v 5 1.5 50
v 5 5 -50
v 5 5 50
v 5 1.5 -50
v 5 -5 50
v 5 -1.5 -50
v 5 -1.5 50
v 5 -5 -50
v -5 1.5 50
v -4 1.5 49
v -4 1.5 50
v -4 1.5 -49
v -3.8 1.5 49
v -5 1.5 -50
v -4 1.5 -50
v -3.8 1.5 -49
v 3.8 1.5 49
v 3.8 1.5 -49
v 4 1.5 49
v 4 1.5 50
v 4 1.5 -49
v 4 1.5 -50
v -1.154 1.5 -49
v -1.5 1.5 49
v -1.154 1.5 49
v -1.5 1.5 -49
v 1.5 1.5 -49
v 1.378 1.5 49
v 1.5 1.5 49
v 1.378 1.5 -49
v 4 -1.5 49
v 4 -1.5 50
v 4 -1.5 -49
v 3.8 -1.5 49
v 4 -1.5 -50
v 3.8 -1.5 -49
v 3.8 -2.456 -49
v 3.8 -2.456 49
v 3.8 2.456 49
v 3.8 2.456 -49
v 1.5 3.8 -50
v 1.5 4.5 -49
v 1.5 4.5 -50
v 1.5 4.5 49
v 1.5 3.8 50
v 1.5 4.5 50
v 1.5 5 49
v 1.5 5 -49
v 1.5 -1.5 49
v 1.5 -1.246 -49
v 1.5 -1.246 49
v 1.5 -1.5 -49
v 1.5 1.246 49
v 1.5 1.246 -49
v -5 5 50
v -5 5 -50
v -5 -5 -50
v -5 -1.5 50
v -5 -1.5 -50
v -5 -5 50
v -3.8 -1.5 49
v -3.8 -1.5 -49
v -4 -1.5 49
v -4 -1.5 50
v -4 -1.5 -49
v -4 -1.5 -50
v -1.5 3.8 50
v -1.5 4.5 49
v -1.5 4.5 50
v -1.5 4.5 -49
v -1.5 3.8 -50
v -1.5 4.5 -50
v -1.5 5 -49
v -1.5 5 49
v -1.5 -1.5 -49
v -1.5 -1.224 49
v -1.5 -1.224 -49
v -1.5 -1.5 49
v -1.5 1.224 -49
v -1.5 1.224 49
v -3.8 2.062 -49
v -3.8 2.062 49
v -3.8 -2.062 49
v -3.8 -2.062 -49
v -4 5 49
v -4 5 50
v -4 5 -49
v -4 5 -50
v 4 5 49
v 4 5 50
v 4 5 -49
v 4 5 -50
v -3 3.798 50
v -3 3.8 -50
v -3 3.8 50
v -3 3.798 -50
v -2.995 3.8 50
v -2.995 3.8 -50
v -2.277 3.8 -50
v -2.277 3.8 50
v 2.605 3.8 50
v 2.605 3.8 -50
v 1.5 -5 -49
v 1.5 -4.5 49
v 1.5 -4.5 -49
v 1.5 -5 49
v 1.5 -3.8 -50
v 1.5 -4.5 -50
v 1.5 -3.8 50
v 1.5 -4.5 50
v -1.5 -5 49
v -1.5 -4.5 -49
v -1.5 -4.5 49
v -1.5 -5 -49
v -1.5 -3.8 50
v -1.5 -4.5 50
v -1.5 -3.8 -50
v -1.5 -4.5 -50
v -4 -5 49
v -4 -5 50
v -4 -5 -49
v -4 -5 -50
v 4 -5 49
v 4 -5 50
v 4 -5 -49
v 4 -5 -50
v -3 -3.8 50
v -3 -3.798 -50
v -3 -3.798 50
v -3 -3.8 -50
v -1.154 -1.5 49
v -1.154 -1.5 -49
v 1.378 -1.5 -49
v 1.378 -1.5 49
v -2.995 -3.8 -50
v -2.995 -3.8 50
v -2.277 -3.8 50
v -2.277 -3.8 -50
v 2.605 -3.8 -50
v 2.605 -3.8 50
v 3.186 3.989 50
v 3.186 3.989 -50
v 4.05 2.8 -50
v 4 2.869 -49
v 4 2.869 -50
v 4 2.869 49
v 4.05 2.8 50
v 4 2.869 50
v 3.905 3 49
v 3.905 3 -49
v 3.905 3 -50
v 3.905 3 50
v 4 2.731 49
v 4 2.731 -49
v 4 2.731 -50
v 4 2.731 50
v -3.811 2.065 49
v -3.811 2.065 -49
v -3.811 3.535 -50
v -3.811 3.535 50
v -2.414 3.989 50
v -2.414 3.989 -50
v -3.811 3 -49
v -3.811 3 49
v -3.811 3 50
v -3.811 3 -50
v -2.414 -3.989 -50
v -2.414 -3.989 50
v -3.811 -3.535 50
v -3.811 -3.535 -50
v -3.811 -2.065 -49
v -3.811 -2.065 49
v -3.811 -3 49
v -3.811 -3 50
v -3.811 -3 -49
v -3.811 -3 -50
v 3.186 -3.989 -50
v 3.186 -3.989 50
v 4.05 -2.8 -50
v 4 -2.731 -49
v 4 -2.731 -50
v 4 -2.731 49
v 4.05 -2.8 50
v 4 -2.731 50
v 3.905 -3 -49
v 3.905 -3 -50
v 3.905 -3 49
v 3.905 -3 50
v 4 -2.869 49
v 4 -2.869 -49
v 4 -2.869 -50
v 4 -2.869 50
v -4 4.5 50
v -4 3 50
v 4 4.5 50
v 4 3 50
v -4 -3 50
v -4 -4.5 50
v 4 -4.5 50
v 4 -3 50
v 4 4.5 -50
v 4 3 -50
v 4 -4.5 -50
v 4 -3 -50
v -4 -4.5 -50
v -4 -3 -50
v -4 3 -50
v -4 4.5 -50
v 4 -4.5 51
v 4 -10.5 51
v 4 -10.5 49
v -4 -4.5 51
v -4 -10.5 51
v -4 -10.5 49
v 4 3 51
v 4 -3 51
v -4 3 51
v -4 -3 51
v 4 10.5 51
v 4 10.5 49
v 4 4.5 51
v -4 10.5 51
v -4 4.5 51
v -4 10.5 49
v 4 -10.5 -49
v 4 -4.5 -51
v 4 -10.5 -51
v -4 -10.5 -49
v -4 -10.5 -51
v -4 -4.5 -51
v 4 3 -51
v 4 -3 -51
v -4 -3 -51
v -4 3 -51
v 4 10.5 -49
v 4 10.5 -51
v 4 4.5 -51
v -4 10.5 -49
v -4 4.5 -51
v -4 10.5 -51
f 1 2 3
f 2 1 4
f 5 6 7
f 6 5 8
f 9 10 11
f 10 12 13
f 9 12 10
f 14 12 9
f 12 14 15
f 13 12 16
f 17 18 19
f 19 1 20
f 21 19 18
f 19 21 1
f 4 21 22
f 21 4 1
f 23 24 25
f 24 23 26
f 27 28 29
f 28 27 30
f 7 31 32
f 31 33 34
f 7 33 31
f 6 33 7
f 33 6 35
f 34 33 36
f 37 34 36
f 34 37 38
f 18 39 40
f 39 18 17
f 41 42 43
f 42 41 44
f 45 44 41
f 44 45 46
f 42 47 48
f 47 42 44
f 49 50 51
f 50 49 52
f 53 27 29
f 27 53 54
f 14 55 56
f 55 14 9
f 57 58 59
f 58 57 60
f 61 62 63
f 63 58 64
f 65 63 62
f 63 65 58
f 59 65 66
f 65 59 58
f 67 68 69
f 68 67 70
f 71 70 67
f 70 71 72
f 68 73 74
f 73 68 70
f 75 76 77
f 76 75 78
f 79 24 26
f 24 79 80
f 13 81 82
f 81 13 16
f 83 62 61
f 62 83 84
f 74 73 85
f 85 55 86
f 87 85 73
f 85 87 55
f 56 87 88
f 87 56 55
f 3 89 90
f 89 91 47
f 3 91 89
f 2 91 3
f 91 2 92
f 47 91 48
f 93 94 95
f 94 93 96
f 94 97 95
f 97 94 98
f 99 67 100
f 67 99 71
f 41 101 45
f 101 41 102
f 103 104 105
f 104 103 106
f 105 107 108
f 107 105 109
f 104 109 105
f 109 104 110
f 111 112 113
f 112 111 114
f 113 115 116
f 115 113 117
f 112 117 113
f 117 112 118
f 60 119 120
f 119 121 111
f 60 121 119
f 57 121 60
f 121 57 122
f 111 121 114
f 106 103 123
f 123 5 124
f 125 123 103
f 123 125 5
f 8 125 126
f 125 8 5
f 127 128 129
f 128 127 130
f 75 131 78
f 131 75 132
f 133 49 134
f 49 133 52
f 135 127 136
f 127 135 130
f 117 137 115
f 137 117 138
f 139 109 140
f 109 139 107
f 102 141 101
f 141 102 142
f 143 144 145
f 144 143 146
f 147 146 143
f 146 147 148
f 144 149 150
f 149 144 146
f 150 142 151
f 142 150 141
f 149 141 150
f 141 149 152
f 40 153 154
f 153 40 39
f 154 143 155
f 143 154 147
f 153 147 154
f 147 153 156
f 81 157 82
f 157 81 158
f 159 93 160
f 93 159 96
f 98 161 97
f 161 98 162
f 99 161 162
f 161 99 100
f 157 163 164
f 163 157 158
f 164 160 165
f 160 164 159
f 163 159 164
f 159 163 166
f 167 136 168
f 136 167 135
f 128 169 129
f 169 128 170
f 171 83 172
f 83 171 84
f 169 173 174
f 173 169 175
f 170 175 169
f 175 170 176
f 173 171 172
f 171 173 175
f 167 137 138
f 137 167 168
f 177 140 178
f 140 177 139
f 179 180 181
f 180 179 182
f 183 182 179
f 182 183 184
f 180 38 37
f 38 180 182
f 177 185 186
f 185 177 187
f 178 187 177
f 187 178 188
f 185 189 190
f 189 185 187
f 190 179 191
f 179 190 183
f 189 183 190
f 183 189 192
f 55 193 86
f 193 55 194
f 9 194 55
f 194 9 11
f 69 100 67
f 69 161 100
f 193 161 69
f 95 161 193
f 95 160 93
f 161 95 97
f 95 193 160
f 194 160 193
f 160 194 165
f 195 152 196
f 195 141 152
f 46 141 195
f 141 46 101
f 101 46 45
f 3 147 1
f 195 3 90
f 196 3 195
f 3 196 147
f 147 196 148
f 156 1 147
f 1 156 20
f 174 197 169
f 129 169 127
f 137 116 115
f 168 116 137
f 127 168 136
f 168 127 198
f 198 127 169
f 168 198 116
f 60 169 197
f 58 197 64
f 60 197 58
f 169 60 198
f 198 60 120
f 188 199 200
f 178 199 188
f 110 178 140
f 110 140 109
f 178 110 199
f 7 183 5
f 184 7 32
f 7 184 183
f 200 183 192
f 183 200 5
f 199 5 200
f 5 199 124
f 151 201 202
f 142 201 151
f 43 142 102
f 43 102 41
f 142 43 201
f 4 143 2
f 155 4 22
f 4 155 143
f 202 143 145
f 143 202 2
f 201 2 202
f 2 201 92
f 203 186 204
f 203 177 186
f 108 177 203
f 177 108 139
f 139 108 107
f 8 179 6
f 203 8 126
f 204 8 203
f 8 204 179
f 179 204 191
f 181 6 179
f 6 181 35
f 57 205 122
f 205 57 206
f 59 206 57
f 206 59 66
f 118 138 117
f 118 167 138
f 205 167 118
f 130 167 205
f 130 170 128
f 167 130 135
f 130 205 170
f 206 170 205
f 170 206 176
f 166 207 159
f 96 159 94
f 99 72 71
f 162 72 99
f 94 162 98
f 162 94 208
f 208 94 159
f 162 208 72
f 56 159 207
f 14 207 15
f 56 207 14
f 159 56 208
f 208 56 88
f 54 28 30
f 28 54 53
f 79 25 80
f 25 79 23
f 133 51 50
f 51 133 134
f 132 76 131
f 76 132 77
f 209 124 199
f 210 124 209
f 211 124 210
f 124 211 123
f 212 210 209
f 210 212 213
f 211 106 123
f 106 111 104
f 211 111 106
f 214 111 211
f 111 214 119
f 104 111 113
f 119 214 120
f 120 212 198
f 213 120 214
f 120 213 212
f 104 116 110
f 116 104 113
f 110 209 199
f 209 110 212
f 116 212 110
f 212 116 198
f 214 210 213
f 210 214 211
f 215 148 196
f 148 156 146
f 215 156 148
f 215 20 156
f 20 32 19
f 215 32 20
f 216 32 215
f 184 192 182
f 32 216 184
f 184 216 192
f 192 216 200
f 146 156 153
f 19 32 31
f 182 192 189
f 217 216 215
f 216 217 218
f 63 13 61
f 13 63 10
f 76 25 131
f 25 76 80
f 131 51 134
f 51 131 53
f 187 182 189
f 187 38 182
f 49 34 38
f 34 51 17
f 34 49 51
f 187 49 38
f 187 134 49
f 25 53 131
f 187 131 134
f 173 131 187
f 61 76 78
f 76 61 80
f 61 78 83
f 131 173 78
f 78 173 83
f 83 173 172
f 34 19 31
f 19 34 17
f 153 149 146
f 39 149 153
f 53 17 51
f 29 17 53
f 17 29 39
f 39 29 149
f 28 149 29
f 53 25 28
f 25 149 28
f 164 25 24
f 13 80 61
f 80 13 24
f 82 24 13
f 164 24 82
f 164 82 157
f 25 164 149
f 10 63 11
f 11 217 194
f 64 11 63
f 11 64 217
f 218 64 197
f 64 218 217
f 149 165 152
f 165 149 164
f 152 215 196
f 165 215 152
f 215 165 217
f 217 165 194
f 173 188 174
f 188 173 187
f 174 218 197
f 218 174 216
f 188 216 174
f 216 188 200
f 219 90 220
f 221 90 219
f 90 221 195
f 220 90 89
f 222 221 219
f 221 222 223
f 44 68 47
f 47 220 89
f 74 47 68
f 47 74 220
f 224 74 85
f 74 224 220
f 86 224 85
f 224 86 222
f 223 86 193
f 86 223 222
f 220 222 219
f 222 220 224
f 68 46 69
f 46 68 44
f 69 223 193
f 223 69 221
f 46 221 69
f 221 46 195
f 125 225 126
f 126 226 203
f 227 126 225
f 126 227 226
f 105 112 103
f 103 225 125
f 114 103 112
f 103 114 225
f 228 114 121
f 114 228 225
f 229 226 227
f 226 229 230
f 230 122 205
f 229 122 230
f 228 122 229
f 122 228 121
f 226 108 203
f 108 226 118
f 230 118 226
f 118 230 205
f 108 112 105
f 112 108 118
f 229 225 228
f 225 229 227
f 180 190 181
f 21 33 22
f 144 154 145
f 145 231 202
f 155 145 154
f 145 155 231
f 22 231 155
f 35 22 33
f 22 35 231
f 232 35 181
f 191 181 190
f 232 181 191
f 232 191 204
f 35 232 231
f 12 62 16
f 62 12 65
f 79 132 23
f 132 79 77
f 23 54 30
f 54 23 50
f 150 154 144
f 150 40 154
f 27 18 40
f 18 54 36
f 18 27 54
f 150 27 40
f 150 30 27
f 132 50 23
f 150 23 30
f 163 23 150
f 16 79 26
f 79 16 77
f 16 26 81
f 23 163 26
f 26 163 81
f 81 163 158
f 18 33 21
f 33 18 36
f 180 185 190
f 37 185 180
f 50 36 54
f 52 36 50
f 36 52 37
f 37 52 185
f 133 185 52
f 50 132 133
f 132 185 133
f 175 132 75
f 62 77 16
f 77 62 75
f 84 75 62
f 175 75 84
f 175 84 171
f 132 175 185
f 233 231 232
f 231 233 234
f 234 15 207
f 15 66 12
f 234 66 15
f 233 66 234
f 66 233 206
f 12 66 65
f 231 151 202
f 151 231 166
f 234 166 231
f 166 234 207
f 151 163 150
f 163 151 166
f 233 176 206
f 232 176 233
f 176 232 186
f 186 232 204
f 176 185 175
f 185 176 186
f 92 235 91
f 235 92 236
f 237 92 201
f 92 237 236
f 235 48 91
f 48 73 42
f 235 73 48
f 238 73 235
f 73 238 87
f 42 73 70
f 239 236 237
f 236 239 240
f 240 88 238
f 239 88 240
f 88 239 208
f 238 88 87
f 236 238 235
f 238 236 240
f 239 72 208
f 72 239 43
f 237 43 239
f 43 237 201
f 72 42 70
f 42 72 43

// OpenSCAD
// Parameters
cross_section_width_mm = 10; //[5:20:0.5]
cross_section_height_mm = 10; //[5:20:0.5]
length_mm = 100; //[50:200:1]
t_slot_opening_width_mm = 3; //[1.5:6:0.25]
t_slot_inner_width_mm = 6; //[3:9:0.25]
t_slot_depth_mm = 2.5; //[1:4.5:0.25]
t_slot_neck_depth_mm = 1.2; //[0.5:2.5:0.1]
center_bore_diameter_mm = 4.2; //[2:7:0.1]
corner_hole_diameter_mm = 2.5; //[1.5:4:0.1]
corner_hole_inset_mm = 2.2; //[1.2:4:0.1]
overlap_mm = 1; //[0.5:2:0.1]

// --- Helper: small "rectangular pieces" that must be attached to the extrusion ends ---
// These are thin tabs that overlap into the extrusion by overlap_mm to guarantee connection.
module end_tabs(z_sign=+1, tab_count=3) {
  tab_thickness = 2;                 // thickness along Z
  tab_len_y = 6;                     // length along Y (visible in top view)
  tab_w_x = 8;                       // width along X
  tab_gap_y = 1.5;                   // spacing between tabs along Y

  // Place tabs just beyond the end face, but overlapping into the extrusion by overlap_mm.
  // Extrusion spans Z = [-length/2, +length/2]
  z_center = z_sign * (length_mm/2 + tab_thickness/2 - overlap_mm);

  // Center the 3 tabs as a group around Y=0
  total_span = tab_count*tab_len_y + (tab_count-1)*tab_gap_y;
  y0 = -total_span/2 + tab_len_y/2;

  for (i = [0:tab_count-1]) {
    translate([0, y0 + i*(tab_len_y + tab_gap_y), z_center])
      cube([tab_w_x, tab_len_y, tab_thickness], center=true);
  }
}

// Extrusion - complete detailed geometry
module extrusion() {
  color("Silver") {
    union() {
      // Main extrusion body (with cuts)
      difference() {
        // Outer extrusion body
        cube([cross_section_width_mm, cross_section_height_mm, length_mm], center=true);

        // T-slot cuts
        union() {
          // Positive X neck and inner
          translate([cross_section_width_mm/2 - (t_slot_neck_depth_mm + overlap_mm)/2, 0, 0])
            cube([t_slot_neck_depth_mm + overlap_mm, t_slot_opening_width_mm, length_mm + overlap_mm], center=true);
          translate([cross_section_width_mm/2 - t_slot_neck_depth_mm - ((t_slot_depth_mm - t_slot_neck_depth_mm) + overlap_mm)/2, 0, 0])
            cube([(t_slot_depth_mm - t_slot_neck_depth_mm) + overlap_mm, t_slot_inner_width_mm, length_mm + overlap_mm], center=true);

          // Negative X neck and inner
          translate([-cross_section_width_mm/2 + (t_slot_neck_depth_mm + overlap_mm)/2, 0, 0])
            cube([t_slot_neck_depth_mm + overlap_mm, t_slot_opening_width_mm, length_mm + overlap_mm], center=true);
          translate([-cross_section_width_mm/2 + t_slot_neck_depth_mm + ((t_slot_depth_mm - t_slot_neck_depth_mm) + overlap_mm)/2, 0, 0])
            cube([(t_slot_depth_mm - t_slot_neck_depth_mm) + overlap_mm, t_slot_inner_width_mm, length_mm + overlap_mm], center=true);

          // Positive Y neck and inner
          translate([0, cross_section_height_mm/2 - (t_slot_neck_depth_mm + overlap_mm)/2, 0])
            cube([t_slot_opening_width_mm, t_slot_neck_depth_mm + overlap_mm, length_mm + overlap_mm], center=true);
          translate([0, cross_section_height_mm/2 - t_slot_neck_depth_mm - ((t_slot_depth_mm - t_slot_neck_depth_mm) + overlap_mm)/2, 0])
            cube([t_slot_inner_width_mm, (t_slot_depth_mm - t_slot_neck_depth_mm) + overlap_mm, length_mm + overlap_mm], center=true);

          // Negative Y neck and inner
          translate([0, -cross_section_height_mm/2 + (t_slot_neck_depth_mm + overlap_mm)/2, 0])
            cube([t_slot_opening_width_mm, t_slot_neck_depth_mm + overlap_mm, length_mm + overlap_mm], center=true);
          translate([0, -cross_section_height_mm/2 + t_slot_neck_depth_mm + ((t_slot_depth_mm - t_slot_neck_depth_mm) + overlap_mm)/2, 0])
            cube([t_slot_inner_width_mm, (t_slot_depth_mm - t_slot_neck_depth_mm) + overlap_mm, length_mm + overlap_mm], center=true);
        }

        // Center bore
        cylinder(r=center_bore_diameter_mm/2, h=length_mm + overlap_mm, center=true);

        // Corner holes
        union() {
          translate([cross_section_width_mm/2 - corner_hole_inset_mm, cross_section_height_mm/2 - corner_hole_inset_mm, 0])
            cylinder(r=corner_hole_diameter_mm/2, h=length_mm + overlap_mm, center=true);
          translate([-cross_section_width_mm/2 + corner_hole_inset_mm, cross_section_height_mm/2 - corner_hole_inset_mm, 0])
            cylinder(r=corner_hole_diameter_mm/2, h=length_mm + overlap_mm, center=true);
          translate([-cross_section_width_mm/2 + corner_hole_inset_mm, -cross_section_height_mm/2 + corner_hole_inset_mm, 0])
            cylinder(r=corner_hole_diameter_mm/2, h=length_mm + overlap_mm, center=true);
          translate([cross_section_width_mm/2 - corner_hole_inset_mm, -cross_section_height_mm/2 + corner_hole_inset_mm, 0])
            cylinder(r=corner_hole_diameter_mm/2, h=length_mm + overlap_mm, center=true);
        }
      }

      // --- FIX: attach the "three small rectangular pieces" to BOTH ends of the extrusion ---
      // Top view showed floating pieces above and below; these are now physically connected
      // by overlapping into the extrusion by overlap_mm.
      end_tabs(+1, 3);  // above / +Z end
      end_tabs(-1, 3);  // below / -Z end
    }
  }
}

// Extrusion Cross Section - detailed geometry (kept for reference; not used in final solid)
module extrusion_cross_section() {
  color("Silver") {
    difference() {
      square([cross_section_width_mm, cross_section_height_mm], center=true);

      union() {
        translate([cross_section_width_mm/2 - (t_slot_neck_depth_mm + overlap_mm)/2, 0])
          square([t_slot_neck_depth_mm + overlap_mm, t_slot_opening_width_mm], center=true);
        translate([cross_section_width_mm/2 - t_slot_neck_depth_mm - ((t_slot_depth_mm - t_slot_neck_depth_mm) + overlap_mm)/2, 0])
          square([(t_slot_depth_mm - t_slot_neck_depth_mm) + overlap_mm, t_slot_inner_width_mm], center=true);

        translate([-cross_section_width_mm/2 + (t_slot_neck_depth_mm + overlap_mm)/2, 0])
          square([t_slot_neck_depth_mm + overlap_mm, t_slot_opening_width_mm], center=true);
        translate([-cross_section_width_mm/2 + t_slot_neck_depth_mm + ((t_slot_depth_mm - t_slot_neck_depth_mm) + overlap_mm)/2, 0])
          square([(t_slot_depth_mm - t_slot_neck_depth_mm) + overlap_mm, t_slot_inner_width_mm], center=true);

        translate([0, cross_section_height_mm/2 - (t_slot_neck_depth_mm + overlap_mm)/2])
          square([t_slot_opening_width_mm, t_slot_neck_depth_mm + overlap_mm], center=true);
        translate([0, cross_section_height_mm/2 - t_slot_neck_depth_mm - ((t_slot_depth_mm - t_slot_neck_depth_mm) + overlap_mm)/2])
          square([t_slot_inner_width_mm, (t_slot_depth_mm - t_slot_neck_depth_mm) + overlap_mm], center=true);

        translate([0, -cross_section_height_mm/2 + (t_slot_neck_depth_mm + overlap_mm)/2])
          square([t_slot_opening_width_mm, t_slot_neck_depth_mm + overlap_mm], center=true);
        translate([0, -cross_section_height_mm/2 + t_slot_neck_depth_mm + ((t_slot_depth_mm - t_slot_neck_depth_mm) + overlap_mm)/2])
          square([t_slot_inner_width_mm, (t_slot_depth_mm - t_slot_neck_depth_mm) + overlap_mm], center=true);
      }

      circle(r=center_bore_diameter_mm/2);

      union() {
        translate([cross_section_width_mm/2 - corner_hole_inset_mm, cross_section_height_mm/2 - corner_hole_inset_mm])
          circle(r=corner_hole_diameter_mm/2);
        translate([-cross_section_width_mm/2 + corner_hole_inset_mm, cross_section_height_mm/2 - corner_hole_inset_mm])
          circle(r=corner_hole_diameter_mm/2);
        translate([-cross_section_width_mm/2 + corner_hole_inset_mm, -cross_section_height_mm/2 + corner_hole_inset_mm])
          circle(r=corner_hole_diameter_mm/2);
        translate([cross_section_width_mm/2 - corner_hole_inset_mm, -cross_section_height_mm/2 + corner_hole_inset_mm])
          circle(r=corner_hole_diameter_mm/2);
      }
    }
  }
}

// Assembly: output a single connected solid (extrusion + attached tabs)
module assembly() {
  extrusion();
}

assembly();
